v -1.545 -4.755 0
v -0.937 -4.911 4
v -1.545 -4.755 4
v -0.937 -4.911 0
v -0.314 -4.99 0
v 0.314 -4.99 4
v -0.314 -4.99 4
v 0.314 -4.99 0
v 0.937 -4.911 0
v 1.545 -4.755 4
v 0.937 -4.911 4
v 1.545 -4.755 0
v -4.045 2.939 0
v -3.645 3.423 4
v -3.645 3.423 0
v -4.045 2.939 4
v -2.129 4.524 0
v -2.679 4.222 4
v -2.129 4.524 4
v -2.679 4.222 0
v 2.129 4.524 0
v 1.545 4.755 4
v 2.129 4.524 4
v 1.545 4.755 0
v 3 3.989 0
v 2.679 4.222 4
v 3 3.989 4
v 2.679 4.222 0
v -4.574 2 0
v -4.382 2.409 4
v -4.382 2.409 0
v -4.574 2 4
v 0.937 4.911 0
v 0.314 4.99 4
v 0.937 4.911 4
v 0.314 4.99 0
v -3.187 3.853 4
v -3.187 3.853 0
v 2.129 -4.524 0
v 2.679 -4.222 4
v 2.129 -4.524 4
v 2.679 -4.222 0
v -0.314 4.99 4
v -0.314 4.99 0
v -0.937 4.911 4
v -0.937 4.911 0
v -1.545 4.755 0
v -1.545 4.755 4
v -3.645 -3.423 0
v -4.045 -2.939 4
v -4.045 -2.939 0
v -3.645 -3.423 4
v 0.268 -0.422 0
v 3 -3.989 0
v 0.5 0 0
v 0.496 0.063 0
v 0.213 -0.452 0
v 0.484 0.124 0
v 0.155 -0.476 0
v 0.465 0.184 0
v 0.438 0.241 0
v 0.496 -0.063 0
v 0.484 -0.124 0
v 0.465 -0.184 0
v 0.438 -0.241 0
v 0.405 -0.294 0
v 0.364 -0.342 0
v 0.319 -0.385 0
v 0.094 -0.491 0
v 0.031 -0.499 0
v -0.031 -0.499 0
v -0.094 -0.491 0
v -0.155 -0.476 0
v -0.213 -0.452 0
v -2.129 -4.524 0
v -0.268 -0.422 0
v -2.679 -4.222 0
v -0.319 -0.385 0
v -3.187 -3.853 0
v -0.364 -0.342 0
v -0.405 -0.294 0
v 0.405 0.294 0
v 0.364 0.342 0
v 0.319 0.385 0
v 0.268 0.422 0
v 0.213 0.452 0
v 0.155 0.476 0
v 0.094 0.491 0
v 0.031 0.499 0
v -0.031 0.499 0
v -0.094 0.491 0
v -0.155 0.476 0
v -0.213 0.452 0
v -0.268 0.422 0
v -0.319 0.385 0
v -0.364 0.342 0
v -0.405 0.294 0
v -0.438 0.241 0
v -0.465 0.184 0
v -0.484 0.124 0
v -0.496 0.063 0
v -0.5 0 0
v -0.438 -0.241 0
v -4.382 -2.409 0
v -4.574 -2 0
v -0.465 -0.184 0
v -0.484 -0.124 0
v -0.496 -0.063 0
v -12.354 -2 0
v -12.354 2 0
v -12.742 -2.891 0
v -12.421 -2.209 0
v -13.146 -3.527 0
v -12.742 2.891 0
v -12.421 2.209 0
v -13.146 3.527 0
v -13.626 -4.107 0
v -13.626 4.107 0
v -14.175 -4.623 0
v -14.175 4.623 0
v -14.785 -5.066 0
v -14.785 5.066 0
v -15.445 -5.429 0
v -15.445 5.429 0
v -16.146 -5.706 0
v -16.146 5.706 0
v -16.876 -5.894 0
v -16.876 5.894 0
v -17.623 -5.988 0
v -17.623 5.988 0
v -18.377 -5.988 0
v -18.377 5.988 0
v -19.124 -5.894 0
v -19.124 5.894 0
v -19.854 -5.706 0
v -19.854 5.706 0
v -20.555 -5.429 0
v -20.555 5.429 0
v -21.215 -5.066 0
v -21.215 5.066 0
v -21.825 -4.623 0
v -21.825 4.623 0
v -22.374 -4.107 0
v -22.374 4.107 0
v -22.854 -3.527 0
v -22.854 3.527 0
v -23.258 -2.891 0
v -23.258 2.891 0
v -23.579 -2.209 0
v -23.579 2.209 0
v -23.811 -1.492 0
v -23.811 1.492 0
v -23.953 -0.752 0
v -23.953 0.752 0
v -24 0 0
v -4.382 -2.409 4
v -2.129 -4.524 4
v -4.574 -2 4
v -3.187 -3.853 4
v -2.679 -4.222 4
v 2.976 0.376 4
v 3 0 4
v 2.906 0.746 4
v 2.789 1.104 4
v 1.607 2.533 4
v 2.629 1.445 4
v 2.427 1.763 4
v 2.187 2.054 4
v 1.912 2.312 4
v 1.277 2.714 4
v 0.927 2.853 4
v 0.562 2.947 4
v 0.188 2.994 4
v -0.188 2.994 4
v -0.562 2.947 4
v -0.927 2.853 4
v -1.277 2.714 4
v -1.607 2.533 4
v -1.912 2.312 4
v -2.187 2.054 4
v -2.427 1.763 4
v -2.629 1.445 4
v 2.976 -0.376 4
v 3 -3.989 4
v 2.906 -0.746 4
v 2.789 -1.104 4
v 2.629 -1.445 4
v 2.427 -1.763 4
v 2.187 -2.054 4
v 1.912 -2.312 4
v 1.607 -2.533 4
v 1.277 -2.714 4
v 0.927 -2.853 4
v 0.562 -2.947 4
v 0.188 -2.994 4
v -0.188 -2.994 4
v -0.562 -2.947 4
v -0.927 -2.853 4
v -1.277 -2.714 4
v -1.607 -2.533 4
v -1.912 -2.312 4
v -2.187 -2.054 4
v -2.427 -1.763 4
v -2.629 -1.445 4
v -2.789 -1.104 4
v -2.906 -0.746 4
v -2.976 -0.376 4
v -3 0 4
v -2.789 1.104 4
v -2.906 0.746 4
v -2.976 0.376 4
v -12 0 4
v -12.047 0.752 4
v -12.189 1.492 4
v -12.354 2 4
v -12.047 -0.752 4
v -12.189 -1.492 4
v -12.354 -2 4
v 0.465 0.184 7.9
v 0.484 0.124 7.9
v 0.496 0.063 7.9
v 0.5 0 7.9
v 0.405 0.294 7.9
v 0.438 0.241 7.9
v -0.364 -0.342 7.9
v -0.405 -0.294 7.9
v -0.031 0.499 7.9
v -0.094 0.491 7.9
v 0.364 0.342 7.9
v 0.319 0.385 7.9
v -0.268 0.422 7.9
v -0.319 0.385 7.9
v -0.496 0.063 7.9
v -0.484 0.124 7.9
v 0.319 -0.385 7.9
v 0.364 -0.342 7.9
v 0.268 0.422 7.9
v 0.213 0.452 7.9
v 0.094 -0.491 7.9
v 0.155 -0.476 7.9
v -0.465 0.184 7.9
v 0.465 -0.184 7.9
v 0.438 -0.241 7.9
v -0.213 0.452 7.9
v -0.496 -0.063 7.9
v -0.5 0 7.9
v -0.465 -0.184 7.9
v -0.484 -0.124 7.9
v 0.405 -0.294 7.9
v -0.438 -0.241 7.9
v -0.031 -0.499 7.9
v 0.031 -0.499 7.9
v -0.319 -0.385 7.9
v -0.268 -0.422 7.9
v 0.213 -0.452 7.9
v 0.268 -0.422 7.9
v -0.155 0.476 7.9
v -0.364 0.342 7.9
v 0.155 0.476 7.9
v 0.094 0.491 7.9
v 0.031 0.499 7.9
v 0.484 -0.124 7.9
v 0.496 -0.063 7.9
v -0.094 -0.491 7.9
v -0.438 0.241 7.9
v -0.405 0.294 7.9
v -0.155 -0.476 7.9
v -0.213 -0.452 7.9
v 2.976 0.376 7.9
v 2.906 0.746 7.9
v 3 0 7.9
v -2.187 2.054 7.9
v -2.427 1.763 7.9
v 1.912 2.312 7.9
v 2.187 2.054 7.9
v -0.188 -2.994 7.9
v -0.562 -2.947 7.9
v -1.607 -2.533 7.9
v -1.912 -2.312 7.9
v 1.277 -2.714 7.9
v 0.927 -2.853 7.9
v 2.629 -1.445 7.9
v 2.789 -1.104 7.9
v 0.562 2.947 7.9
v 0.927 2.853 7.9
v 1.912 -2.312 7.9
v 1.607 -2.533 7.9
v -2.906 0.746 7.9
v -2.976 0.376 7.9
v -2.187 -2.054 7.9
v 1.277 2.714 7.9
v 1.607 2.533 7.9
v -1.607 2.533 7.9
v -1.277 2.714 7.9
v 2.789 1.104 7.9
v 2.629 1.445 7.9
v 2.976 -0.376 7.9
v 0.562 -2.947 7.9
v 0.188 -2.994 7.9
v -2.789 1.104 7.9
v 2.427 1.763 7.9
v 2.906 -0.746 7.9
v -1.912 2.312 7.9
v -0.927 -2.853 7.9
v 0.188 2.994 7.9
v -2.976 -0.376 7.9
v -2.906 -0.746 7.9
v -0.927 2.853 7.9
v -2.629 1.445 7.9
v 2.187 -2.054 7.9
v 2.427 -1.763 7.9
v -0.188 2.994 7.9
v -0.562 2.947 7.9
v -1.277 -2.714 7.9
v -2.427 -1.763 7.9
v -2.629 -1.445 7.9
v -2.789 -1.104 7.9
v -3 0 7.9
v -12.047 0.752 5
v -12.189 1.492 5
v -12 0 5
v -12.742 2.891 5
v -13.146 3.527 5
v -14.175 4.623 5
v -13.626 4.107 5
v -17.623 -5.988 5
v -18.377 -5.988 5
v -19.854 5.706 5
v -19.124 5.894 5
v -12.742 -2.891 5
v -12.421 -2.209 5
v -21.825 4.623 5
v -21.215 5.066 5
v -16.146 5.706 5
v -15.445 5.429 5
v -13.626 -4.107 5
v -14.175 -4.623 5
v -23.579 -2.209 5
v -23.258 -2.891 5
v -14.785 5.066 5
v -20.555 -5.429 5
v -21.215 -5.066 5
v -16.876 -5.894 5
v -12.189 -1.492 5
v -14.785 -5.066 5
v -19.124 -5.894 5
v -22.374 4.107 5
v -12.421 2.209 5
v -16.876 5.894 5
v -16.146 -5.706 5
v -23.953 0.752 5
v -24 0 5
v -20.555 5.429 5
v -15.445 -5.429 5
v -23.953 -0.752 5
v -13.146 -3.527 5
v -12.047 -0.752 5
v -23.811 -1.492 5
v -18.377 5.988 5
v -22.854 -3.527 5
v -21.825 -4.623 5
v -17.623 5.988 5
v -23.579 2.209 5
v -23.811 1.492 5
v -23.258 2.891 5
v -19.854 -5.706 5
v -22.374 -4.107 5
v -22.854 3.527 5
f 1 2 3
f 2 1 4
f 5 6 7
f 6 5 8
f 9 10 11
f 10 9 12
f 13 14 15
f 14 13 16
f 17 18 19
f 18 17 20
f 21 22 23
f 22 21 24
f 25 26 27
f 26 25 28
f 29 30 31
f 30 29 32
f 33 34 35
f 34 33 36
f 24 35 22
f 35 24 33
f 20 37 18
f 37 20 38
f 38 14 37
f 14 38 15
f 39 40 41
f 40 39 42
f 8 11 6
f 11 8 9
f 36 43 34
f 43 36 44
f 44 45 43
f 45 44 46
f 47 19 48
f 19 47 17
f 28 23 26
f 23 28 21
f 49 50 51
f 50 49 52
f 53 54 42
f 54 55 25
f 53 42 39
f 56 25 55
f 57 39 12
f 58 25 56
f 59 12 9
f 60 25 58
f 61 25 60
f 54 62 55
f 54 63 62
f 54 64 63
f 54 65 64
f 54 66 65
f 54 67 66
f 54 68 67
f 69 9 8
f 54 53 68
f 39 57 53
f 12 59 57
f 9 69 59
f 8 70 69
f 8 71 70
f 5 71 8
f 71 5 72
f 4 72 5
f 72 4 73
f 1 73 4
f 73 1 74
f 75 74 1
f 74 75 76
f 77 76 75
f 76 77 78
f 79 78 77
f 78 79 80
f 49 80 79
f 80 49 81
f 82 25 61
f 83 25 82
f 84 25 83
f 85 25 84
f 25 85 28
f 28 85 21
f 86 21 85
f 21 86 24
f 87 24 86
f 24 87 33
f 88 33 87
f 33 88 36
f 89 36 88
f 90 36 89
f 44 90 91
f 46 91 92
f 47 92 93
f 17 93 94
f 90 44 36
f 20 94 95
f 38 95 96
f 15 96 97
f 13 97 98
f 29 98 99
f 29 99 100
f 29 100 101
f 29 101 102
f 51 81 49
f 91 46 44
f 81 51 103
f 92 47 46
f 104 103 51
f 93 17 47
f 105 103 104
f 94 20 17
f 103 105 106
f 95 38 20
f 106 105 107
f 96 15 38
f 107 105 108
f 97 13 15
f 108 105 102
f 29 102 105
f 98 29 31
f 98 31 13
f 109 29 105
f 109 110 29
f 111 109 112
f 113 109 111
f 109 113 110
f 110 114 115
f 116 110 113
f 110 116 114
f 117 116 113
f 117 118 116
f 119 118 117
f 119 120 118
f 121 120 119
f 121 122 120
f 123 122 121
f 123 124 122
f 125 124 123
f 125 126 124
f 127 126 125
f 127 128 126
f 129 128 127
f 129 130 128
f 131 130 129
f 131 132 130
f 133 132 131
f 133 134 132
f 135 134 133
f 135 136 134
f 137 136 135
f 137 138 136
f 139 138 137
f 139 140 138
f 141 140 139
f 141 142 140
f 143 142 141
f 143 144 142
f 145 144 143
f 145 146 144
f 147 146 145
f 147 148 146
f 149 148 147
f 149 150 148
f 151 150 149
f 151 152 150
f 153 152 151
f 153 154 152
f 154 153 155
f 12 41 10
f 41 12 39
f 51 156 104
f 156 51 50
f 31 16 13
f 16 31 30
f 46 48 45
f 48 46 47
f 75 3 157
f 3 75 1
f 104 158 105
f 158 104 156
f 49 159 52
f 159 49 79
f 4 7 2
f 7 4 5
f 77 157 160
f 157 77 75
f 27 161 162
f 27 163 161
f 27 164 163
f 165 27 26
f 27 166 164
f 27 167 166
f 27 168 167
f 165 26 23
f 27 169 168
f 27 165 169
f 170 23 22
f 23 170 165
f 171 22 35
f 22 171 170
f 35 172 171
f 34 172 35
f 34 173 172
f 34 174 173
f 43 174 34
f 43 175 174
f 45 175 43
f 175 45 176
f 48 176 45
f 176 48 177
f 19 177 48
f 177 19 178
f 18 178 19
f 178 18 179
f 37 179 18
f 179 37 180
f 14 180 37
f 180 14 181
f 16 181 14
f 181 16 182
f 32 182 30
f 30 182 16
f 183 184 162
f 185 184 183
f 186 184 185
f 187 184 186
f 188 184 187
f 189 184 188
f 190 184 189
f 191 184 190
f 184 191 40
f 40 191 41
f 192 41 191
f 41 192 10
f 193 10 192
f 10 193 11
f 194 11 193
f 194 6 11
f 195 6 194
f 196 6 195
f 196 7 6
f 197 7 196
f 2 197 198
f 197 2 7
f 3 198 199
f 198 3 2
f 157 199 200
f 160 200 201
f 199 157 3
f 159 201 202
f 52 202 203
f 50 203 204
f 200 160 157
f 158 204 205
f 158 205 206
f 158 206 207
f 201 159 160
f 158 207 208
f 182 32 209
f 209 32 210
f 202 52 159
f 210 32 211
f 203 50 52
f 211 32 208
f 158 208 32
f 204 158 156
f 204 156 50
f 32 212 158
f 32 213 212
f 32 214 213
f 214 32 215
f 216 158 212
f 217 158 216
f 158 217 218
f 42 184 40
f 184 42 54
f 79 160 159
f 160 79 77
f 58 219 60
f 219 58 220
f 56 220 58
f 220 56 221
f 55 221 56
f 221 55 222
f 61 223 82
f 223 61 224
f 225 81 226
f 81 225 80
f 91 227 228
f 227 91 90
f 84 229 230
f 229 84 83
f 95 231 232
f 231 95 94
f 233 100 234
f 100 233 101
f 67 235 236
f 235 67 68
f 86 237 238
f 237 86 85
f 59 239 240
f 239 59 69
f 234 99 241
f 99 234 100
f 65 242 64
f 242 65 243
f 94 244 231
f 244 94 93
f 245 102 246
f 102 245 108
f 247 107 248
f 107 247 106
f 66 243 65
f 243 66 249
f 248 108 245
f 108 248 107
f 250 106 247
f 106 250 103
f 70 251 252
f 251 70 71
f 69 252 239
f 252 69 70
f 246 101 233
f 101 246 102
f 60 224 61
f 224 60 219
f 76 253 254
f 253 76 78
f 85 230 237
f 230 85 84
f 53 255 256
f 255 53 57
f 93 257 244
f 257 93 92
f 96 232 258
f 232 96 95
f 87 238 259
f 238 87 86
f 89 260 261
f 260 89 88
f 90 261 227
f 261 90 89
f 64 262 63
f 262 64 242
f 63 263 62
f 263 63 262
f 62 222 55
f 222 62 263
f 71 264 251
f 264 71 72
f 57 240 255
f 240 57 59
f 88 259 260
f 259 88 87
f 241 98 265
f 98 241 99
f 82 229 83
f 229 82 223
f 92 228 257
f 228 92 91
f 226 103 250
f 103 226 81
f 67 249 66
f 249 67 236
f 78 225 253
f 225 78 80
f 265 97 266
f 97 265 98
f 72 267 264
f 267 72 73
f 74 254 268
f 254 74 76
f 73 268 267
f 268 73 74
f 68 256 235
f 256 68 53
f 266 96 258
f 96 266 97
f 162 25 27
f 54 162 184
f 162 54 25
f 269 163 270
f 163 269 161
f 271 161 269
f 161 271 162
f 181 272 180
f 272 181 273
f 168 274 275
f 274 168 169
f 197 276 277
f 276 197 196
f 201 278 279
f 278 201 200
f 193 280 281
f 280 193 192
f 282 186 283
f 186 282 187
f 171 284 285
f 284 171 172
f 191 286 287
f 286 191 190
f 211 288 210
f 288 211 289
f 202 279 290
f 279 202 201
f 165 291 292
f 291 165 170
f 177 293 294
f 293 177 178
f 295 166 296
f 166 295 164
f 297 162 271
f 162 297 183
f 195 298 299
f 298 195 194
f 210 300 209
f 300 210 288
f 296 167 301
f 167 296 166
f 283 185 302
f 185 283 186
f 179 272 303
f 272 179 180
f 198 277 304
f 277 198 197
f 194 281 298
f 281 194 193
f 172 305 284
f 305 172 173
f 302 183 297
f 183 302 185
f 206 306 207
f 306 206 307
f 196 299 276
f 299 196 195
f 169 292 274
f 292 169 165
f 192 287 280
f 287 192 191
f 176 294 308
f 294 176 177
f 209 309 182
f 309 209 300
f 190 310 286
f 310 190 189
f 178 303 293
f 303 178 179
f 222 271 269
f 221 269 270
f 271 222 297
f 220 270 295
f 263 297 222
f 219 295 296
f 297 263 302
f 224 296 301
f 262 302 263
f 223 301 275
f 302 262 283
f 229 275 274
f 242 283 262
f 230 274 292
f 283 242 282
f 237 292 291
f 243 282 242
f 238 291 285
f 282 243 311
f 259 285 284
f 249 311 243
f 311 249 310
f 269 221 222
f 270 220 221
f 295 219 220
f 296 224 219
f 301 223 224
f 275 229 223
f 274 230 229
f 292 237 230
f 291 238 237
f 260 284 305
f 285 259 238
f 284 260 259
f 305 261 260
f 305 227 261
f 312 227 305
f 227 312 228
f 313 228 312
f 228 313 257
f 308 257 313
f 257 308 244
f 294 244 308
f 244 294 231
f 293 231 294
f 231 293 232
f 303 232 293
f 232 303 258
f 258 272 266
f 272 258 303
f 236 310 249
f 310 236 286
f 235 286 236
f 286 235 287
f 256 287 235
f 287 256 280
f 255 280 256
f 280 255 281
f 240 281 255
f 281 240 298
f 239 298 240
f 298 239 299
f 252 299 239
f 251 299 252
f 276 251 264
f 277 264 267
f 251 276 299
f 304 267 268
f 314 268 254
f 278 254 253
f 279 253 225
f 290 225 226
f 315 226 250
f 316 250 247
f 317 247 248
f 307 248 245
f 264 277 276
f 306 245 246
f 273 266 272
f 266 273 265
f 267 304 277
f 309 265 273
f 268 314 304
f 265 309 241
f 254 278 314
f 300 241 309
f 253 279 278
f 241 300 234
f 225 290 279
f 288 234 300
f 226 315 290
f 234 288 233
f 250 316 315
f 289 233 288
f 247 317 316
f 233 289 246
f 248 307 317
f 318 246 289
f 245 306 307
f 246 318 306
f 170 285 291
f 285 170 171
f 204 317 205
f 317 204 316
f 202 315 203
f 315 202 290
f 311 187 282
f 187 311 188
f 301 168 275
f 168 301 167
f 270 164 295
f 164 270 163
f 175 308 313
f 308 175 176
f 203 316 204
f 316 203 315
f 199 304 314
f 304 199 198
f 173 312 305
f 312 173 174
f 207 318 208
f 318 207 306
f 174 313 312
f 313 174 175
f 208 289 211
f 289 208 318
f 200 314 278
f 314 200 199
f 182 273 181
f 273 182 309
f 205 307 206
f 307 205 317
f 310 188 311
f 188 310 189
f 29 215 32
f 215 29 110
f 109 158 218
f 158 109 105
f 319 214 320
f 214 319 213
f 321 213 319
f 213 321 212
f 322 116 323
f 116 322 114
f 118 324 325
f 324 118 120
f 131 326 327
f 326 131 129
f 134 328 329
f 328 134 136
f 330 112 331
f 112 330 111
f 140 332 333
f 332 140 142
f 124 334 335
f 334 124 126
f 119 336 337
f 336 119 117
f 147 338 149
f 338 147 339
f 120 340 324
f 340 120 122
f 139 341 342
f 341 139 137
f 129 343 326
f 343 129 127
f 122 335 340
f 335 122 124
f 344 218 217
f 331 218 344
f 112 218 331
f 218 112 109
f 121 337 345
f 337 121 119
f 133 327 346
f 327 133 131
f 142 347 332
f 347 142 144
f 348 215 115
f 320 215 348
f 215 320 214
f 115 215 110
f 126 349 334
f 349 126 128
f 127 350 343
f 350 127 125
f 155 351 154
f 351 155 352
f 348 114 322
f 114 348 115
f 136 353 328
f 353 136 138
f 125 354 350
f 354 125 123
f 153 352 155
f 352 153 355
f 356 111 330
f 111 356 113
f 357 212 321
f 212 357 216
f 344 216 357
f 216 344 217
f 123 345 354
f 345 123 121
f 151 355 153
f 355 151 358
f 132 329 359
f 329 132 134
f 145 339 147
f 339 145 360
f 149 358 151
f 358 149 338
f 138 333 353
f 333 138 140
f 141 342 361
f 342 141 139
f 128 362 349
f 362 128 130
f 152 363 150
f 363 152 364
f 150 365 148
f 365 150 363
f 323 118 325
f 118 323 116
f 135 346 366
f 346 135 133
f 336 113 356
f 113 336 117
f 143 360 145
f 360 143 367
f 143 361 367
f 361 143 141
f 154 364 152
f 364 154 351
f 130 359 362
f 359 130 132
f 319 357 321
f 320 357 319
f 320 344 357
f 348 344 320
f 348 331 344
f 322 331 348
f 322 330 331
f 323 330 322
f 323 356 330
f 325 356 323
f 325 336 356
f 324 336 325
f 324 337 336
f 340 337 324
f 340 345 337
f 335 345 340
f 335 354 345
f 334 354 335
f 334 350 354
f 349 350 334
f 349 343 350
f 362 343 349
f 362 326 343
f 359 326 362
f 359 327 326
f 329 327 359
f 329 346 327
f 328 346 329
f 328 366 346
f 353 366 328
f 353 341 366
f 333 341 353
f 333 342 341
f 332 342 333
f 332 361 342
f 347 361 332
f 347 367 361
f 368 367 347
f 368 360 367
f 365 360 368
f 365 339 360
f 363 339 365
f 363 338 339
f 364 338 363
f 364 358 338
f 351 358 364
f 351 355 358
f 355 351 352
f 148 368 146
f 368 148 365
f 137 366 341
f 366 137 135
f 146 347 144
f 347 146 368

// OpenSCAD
// [FL_INDEX: keywords="openscad, 3d_parametric, Eccentric_weight_for_vibrobots, csg_solid" | COT="Parametric OpenSCAD design from 3DCodeverse"]
// Title: Eccentric weight for vibrobots

/*
	Parametric Eccentric Weight for Vibrobot 
	by Kevin Osborn
*/
//Shaft Diameter in mm  
shaftdiameter = 1.0; 
//Weight Diameter in mm
weightdiameter =12;
//Arm Length in mm
armLength = 12;

/* [hidden] */
shaftR = shaftdiameter/2;
weightR = weightdiameter/2;
$fn=50;

union(){
difference(){
cylinder(r1=5,r2=5,h=4);
cylinder(r1=shaftR,r2=shaftR,h=15);
translate([3,-7,0])cube([14,14,5]);
}
translate([-armLength-2,-2,0])cube([armLength,4,4]);
translate([-(armLength+weightR),0,0])cylinder(r1=weightR,r2=weightR,h=5);
difference(){
translate([0,0,3.9])cylinder(r1=3,r2=3,h=4);
cylinder(r1=shaftR,r2=shaftR,h=15);
}
}
